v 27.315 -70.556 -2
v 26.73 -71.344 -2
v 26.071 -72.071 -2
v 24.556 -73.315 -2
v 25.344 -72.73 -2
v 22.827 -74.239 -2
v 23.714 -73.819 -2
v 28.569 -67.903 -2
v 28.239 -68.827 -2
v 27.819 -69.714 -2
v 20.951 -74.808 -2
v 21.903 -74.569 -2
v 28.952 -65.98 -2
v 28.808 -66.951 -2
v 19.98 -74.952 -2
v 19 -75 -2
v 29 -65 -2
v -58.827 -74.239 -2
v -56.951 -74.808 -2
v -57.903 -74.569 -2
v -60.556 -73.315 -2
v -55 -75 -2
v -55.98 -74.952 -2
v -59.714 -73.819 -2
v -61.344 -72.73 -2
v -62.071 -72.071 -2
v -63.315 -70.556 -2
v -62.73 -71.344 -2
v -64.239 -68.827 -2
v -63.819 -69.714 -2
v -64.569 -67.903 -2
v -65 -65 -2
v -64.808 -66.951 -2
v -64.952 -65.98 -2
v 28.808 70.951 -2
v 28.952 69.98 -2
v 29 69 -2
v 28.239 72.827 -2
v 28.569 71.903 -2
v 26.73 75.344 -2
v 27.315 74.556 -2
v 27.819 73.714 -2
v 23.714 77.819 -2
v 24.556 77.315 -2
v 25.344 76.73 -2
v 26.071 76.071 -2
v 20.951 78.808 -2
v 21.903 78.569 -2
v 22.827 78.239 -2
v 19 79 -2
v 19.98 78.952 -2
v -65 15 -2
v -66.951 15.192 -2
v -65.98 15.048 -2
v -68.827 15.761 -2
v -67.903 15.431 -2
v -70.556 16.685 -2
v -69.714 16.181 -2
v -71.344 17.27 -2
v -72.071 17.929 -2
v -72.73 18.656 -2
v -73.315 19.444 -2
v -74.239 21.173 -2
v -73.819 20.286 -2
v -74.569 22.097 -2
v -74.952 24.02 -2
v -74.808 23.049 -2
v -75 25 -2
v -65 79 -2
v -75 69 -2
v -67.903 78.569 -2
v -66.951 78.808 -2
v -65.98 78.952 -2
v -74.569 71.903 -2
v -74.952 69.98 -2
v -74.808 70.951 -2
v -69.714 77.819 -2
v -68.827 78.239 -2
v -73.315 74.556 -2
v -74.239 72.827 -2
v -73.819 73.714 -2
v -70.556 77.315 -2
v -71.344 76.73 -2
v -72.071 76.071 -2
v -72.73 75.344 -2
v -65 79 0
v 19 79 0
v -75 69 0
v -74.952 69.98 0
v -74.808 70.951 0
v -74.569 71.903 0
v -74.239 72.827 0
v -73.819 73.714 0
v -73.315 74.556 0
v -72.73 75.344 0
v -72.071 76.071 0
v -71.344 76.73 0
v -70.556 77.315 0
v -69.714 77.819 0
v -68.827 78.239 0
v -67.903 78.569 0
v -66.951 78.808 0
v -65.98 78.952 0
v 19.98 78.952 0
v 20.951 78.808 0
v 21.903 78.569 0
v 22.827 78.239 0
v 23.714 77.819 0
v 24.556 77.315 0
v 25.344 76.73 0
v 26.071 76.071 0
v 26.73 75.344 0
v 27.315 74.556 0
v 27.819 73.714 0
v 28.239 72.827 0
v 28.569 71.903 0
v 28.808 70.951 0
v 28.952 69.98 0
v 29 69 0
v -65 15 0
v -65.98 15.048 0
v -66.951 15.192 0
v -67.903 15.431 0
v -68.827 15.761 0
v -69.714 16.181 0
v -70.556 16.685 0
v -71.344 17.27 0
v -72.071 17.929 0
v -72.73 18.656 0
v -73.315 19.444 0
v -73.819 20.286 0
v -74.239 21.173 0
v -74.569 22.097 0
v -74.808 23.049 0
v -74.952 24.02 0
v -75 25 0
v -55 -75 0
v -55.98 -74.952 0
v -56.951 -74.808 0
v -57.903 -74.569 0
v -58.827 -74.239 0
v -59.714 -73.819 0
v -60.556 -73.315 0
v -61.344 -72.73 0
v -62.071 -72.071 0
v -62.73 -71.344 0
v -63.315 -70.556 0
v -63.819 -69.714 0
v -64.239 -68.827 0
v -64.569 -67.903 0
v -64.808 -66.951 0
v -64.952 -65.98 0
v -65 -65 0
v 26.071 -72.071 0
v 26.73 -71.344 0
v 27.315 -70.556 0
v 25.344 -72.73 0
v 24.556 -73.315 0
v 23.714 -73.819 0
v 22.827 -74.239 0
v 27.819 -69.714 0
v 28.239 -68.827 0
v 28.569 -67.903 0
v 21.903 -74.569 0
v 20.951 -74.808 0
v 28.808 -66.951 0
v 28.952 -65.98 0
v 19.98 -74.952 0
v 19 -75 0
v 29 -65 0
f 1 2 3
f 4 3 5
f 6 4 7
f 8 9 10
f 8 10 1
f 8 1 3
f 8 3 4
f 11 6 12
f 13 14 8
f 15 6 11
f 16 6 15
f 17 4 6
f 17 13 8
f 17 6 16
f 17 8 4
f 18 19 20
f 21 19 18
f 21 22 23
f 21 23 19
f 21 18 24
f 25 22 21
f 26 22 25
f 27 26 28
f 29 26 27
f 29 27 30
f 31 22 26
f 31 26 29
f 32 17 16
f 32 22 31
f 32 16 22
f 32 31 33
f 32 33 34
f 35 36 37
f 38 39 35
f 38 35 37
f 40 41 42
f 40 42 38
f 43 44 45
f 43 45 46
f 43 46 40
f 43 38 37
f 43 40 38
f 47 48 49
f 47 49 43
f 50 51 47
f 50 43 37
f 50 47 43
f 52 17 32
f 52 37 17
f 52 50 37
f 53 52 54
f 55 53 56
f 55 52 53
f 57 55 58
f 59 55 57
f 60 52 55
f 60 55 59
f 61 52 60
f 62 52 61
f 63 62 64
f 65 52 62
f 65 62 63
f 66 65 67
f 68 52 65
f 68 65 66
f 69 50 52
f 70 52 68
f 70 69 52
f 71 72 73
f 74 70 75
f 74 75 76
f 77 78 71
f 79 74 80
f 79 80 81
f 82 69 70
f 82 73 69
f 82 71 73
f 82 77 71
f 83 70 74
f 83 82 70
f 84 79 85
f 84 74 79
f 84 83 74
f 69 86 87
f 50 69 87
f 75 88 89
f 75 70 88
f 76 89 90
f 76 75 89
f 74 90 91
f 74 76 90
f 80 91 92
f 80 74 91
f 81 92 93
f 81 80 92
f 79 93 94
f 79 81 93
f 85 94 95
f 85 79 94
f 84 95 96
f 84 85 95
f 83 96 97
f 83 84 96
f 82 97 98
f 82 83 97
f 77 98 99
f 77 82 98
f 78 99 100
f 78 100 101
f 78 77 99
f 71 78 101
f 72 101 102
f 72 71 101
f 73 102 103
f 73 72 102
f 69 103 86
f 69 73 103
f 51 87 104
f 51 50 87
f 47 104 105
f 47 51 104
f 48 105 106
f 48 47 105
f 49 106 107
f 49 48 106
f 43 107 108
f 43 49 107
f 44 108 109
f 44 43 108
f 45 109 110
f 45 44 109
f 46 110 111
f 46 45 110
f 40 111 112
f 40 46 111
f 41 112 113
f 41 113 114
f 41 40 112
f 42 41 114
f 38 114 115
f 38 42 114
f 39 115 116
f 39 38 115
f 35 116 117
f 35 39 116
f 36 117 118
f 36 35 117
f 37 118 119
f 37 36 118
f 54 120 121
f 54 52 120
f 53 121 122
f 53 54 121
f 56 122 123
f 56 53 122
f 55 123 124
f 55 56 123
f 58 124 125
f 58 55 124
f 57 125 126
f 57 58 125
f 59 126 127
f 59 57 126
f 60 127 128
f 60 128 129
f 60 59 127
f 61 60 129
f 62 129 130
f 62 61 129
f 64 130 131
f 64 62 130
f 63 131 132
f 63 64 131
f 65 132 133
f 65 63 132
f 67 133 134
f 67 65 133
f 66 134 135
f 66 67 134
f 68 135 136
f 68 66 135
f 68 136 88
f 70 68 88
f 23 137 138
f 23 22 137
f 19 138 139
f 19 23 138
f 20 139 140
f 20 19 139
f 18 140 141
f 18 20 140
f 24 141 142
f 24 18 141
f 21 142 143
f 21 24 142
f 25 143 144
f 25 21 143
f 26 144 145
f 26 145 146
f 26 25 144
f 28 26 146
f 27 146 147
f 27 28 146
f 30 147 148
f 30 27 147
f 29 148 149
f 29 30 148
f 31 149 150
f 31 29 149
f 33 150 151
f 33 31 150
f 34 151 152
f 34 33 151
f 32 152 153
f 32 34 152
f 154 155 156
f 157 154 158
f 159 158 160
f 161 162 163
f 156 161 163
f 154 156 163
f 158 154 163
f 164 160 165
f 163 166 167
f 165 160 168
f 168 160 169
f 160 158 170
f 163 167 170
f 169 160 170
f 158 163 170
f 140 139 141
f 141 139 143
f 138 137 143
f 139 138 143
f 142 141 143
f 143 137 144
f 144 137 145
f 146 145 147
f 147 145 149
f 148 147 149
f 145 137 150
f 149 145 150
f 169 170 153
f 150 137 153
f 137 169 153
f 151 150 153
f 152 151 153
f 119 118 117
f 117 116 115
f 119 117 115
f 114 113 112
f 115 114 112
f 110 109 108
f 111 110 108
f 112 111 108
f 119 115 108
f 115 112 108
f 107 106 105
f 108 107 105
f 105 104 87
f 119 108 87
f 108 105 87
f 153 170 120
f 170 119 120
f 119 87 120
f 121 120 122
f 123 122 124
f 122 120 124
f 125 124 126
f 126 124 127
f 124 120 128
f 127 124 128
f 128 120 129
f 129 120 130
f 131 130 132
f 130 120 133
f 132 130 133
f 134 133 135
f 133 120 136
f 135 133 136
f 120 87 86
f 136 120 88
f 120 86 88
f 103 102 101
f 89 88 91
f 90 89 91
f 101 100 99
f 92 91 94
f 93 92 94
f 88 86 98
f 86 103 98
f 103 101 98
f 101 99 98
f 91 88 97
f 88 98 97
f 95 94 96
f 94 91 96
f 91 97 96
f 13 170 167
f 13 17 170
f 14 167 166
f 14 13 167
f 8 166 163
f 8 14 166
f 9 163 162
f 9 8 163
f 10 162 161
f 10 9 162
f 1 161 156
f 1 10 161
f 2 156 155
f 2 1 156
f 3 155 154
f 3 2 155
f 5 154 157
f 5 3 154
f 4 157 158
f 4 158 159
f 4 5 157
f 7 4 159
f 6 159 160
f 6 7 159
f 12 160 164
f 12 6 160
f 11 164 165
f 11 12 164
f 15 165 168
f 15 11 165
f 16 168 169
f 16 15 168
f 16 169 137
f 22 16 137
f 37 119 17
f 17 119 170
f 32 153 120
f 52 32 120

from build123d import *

# Parameters (mm, degrees)
BASE_FLANGE1_DEPTH = 2
FILLET1_R          = 10


# Sheet-metal steps are written as plain solids
with BuildPart() as part:
    # Sketch1 → Base-Flange1 (new body)
    with BuildSketch(Plane.XY):
        Polygon((-65, 15), (-75, 15), (-75, 79), (29, 79), (29, -75), (-65, -75), align=None)
    extrude(amount=-BASE_FLANGE1_DEPTH)

    # Fillet1
    fillet1_edges = [part.edges().sort_by_distance(p)[0] for p in [
        (-75, 79, -1),
        (-75, 15, -1),
        (-65, -75, -1),
        (29, -75, -1),
        (29, 79, -1),
    ]]
    fillet(fillet1_edges, radius=FILLET1_R - 0.0001)  # a hair under: the kernel refuses the full size


solid = part.part
